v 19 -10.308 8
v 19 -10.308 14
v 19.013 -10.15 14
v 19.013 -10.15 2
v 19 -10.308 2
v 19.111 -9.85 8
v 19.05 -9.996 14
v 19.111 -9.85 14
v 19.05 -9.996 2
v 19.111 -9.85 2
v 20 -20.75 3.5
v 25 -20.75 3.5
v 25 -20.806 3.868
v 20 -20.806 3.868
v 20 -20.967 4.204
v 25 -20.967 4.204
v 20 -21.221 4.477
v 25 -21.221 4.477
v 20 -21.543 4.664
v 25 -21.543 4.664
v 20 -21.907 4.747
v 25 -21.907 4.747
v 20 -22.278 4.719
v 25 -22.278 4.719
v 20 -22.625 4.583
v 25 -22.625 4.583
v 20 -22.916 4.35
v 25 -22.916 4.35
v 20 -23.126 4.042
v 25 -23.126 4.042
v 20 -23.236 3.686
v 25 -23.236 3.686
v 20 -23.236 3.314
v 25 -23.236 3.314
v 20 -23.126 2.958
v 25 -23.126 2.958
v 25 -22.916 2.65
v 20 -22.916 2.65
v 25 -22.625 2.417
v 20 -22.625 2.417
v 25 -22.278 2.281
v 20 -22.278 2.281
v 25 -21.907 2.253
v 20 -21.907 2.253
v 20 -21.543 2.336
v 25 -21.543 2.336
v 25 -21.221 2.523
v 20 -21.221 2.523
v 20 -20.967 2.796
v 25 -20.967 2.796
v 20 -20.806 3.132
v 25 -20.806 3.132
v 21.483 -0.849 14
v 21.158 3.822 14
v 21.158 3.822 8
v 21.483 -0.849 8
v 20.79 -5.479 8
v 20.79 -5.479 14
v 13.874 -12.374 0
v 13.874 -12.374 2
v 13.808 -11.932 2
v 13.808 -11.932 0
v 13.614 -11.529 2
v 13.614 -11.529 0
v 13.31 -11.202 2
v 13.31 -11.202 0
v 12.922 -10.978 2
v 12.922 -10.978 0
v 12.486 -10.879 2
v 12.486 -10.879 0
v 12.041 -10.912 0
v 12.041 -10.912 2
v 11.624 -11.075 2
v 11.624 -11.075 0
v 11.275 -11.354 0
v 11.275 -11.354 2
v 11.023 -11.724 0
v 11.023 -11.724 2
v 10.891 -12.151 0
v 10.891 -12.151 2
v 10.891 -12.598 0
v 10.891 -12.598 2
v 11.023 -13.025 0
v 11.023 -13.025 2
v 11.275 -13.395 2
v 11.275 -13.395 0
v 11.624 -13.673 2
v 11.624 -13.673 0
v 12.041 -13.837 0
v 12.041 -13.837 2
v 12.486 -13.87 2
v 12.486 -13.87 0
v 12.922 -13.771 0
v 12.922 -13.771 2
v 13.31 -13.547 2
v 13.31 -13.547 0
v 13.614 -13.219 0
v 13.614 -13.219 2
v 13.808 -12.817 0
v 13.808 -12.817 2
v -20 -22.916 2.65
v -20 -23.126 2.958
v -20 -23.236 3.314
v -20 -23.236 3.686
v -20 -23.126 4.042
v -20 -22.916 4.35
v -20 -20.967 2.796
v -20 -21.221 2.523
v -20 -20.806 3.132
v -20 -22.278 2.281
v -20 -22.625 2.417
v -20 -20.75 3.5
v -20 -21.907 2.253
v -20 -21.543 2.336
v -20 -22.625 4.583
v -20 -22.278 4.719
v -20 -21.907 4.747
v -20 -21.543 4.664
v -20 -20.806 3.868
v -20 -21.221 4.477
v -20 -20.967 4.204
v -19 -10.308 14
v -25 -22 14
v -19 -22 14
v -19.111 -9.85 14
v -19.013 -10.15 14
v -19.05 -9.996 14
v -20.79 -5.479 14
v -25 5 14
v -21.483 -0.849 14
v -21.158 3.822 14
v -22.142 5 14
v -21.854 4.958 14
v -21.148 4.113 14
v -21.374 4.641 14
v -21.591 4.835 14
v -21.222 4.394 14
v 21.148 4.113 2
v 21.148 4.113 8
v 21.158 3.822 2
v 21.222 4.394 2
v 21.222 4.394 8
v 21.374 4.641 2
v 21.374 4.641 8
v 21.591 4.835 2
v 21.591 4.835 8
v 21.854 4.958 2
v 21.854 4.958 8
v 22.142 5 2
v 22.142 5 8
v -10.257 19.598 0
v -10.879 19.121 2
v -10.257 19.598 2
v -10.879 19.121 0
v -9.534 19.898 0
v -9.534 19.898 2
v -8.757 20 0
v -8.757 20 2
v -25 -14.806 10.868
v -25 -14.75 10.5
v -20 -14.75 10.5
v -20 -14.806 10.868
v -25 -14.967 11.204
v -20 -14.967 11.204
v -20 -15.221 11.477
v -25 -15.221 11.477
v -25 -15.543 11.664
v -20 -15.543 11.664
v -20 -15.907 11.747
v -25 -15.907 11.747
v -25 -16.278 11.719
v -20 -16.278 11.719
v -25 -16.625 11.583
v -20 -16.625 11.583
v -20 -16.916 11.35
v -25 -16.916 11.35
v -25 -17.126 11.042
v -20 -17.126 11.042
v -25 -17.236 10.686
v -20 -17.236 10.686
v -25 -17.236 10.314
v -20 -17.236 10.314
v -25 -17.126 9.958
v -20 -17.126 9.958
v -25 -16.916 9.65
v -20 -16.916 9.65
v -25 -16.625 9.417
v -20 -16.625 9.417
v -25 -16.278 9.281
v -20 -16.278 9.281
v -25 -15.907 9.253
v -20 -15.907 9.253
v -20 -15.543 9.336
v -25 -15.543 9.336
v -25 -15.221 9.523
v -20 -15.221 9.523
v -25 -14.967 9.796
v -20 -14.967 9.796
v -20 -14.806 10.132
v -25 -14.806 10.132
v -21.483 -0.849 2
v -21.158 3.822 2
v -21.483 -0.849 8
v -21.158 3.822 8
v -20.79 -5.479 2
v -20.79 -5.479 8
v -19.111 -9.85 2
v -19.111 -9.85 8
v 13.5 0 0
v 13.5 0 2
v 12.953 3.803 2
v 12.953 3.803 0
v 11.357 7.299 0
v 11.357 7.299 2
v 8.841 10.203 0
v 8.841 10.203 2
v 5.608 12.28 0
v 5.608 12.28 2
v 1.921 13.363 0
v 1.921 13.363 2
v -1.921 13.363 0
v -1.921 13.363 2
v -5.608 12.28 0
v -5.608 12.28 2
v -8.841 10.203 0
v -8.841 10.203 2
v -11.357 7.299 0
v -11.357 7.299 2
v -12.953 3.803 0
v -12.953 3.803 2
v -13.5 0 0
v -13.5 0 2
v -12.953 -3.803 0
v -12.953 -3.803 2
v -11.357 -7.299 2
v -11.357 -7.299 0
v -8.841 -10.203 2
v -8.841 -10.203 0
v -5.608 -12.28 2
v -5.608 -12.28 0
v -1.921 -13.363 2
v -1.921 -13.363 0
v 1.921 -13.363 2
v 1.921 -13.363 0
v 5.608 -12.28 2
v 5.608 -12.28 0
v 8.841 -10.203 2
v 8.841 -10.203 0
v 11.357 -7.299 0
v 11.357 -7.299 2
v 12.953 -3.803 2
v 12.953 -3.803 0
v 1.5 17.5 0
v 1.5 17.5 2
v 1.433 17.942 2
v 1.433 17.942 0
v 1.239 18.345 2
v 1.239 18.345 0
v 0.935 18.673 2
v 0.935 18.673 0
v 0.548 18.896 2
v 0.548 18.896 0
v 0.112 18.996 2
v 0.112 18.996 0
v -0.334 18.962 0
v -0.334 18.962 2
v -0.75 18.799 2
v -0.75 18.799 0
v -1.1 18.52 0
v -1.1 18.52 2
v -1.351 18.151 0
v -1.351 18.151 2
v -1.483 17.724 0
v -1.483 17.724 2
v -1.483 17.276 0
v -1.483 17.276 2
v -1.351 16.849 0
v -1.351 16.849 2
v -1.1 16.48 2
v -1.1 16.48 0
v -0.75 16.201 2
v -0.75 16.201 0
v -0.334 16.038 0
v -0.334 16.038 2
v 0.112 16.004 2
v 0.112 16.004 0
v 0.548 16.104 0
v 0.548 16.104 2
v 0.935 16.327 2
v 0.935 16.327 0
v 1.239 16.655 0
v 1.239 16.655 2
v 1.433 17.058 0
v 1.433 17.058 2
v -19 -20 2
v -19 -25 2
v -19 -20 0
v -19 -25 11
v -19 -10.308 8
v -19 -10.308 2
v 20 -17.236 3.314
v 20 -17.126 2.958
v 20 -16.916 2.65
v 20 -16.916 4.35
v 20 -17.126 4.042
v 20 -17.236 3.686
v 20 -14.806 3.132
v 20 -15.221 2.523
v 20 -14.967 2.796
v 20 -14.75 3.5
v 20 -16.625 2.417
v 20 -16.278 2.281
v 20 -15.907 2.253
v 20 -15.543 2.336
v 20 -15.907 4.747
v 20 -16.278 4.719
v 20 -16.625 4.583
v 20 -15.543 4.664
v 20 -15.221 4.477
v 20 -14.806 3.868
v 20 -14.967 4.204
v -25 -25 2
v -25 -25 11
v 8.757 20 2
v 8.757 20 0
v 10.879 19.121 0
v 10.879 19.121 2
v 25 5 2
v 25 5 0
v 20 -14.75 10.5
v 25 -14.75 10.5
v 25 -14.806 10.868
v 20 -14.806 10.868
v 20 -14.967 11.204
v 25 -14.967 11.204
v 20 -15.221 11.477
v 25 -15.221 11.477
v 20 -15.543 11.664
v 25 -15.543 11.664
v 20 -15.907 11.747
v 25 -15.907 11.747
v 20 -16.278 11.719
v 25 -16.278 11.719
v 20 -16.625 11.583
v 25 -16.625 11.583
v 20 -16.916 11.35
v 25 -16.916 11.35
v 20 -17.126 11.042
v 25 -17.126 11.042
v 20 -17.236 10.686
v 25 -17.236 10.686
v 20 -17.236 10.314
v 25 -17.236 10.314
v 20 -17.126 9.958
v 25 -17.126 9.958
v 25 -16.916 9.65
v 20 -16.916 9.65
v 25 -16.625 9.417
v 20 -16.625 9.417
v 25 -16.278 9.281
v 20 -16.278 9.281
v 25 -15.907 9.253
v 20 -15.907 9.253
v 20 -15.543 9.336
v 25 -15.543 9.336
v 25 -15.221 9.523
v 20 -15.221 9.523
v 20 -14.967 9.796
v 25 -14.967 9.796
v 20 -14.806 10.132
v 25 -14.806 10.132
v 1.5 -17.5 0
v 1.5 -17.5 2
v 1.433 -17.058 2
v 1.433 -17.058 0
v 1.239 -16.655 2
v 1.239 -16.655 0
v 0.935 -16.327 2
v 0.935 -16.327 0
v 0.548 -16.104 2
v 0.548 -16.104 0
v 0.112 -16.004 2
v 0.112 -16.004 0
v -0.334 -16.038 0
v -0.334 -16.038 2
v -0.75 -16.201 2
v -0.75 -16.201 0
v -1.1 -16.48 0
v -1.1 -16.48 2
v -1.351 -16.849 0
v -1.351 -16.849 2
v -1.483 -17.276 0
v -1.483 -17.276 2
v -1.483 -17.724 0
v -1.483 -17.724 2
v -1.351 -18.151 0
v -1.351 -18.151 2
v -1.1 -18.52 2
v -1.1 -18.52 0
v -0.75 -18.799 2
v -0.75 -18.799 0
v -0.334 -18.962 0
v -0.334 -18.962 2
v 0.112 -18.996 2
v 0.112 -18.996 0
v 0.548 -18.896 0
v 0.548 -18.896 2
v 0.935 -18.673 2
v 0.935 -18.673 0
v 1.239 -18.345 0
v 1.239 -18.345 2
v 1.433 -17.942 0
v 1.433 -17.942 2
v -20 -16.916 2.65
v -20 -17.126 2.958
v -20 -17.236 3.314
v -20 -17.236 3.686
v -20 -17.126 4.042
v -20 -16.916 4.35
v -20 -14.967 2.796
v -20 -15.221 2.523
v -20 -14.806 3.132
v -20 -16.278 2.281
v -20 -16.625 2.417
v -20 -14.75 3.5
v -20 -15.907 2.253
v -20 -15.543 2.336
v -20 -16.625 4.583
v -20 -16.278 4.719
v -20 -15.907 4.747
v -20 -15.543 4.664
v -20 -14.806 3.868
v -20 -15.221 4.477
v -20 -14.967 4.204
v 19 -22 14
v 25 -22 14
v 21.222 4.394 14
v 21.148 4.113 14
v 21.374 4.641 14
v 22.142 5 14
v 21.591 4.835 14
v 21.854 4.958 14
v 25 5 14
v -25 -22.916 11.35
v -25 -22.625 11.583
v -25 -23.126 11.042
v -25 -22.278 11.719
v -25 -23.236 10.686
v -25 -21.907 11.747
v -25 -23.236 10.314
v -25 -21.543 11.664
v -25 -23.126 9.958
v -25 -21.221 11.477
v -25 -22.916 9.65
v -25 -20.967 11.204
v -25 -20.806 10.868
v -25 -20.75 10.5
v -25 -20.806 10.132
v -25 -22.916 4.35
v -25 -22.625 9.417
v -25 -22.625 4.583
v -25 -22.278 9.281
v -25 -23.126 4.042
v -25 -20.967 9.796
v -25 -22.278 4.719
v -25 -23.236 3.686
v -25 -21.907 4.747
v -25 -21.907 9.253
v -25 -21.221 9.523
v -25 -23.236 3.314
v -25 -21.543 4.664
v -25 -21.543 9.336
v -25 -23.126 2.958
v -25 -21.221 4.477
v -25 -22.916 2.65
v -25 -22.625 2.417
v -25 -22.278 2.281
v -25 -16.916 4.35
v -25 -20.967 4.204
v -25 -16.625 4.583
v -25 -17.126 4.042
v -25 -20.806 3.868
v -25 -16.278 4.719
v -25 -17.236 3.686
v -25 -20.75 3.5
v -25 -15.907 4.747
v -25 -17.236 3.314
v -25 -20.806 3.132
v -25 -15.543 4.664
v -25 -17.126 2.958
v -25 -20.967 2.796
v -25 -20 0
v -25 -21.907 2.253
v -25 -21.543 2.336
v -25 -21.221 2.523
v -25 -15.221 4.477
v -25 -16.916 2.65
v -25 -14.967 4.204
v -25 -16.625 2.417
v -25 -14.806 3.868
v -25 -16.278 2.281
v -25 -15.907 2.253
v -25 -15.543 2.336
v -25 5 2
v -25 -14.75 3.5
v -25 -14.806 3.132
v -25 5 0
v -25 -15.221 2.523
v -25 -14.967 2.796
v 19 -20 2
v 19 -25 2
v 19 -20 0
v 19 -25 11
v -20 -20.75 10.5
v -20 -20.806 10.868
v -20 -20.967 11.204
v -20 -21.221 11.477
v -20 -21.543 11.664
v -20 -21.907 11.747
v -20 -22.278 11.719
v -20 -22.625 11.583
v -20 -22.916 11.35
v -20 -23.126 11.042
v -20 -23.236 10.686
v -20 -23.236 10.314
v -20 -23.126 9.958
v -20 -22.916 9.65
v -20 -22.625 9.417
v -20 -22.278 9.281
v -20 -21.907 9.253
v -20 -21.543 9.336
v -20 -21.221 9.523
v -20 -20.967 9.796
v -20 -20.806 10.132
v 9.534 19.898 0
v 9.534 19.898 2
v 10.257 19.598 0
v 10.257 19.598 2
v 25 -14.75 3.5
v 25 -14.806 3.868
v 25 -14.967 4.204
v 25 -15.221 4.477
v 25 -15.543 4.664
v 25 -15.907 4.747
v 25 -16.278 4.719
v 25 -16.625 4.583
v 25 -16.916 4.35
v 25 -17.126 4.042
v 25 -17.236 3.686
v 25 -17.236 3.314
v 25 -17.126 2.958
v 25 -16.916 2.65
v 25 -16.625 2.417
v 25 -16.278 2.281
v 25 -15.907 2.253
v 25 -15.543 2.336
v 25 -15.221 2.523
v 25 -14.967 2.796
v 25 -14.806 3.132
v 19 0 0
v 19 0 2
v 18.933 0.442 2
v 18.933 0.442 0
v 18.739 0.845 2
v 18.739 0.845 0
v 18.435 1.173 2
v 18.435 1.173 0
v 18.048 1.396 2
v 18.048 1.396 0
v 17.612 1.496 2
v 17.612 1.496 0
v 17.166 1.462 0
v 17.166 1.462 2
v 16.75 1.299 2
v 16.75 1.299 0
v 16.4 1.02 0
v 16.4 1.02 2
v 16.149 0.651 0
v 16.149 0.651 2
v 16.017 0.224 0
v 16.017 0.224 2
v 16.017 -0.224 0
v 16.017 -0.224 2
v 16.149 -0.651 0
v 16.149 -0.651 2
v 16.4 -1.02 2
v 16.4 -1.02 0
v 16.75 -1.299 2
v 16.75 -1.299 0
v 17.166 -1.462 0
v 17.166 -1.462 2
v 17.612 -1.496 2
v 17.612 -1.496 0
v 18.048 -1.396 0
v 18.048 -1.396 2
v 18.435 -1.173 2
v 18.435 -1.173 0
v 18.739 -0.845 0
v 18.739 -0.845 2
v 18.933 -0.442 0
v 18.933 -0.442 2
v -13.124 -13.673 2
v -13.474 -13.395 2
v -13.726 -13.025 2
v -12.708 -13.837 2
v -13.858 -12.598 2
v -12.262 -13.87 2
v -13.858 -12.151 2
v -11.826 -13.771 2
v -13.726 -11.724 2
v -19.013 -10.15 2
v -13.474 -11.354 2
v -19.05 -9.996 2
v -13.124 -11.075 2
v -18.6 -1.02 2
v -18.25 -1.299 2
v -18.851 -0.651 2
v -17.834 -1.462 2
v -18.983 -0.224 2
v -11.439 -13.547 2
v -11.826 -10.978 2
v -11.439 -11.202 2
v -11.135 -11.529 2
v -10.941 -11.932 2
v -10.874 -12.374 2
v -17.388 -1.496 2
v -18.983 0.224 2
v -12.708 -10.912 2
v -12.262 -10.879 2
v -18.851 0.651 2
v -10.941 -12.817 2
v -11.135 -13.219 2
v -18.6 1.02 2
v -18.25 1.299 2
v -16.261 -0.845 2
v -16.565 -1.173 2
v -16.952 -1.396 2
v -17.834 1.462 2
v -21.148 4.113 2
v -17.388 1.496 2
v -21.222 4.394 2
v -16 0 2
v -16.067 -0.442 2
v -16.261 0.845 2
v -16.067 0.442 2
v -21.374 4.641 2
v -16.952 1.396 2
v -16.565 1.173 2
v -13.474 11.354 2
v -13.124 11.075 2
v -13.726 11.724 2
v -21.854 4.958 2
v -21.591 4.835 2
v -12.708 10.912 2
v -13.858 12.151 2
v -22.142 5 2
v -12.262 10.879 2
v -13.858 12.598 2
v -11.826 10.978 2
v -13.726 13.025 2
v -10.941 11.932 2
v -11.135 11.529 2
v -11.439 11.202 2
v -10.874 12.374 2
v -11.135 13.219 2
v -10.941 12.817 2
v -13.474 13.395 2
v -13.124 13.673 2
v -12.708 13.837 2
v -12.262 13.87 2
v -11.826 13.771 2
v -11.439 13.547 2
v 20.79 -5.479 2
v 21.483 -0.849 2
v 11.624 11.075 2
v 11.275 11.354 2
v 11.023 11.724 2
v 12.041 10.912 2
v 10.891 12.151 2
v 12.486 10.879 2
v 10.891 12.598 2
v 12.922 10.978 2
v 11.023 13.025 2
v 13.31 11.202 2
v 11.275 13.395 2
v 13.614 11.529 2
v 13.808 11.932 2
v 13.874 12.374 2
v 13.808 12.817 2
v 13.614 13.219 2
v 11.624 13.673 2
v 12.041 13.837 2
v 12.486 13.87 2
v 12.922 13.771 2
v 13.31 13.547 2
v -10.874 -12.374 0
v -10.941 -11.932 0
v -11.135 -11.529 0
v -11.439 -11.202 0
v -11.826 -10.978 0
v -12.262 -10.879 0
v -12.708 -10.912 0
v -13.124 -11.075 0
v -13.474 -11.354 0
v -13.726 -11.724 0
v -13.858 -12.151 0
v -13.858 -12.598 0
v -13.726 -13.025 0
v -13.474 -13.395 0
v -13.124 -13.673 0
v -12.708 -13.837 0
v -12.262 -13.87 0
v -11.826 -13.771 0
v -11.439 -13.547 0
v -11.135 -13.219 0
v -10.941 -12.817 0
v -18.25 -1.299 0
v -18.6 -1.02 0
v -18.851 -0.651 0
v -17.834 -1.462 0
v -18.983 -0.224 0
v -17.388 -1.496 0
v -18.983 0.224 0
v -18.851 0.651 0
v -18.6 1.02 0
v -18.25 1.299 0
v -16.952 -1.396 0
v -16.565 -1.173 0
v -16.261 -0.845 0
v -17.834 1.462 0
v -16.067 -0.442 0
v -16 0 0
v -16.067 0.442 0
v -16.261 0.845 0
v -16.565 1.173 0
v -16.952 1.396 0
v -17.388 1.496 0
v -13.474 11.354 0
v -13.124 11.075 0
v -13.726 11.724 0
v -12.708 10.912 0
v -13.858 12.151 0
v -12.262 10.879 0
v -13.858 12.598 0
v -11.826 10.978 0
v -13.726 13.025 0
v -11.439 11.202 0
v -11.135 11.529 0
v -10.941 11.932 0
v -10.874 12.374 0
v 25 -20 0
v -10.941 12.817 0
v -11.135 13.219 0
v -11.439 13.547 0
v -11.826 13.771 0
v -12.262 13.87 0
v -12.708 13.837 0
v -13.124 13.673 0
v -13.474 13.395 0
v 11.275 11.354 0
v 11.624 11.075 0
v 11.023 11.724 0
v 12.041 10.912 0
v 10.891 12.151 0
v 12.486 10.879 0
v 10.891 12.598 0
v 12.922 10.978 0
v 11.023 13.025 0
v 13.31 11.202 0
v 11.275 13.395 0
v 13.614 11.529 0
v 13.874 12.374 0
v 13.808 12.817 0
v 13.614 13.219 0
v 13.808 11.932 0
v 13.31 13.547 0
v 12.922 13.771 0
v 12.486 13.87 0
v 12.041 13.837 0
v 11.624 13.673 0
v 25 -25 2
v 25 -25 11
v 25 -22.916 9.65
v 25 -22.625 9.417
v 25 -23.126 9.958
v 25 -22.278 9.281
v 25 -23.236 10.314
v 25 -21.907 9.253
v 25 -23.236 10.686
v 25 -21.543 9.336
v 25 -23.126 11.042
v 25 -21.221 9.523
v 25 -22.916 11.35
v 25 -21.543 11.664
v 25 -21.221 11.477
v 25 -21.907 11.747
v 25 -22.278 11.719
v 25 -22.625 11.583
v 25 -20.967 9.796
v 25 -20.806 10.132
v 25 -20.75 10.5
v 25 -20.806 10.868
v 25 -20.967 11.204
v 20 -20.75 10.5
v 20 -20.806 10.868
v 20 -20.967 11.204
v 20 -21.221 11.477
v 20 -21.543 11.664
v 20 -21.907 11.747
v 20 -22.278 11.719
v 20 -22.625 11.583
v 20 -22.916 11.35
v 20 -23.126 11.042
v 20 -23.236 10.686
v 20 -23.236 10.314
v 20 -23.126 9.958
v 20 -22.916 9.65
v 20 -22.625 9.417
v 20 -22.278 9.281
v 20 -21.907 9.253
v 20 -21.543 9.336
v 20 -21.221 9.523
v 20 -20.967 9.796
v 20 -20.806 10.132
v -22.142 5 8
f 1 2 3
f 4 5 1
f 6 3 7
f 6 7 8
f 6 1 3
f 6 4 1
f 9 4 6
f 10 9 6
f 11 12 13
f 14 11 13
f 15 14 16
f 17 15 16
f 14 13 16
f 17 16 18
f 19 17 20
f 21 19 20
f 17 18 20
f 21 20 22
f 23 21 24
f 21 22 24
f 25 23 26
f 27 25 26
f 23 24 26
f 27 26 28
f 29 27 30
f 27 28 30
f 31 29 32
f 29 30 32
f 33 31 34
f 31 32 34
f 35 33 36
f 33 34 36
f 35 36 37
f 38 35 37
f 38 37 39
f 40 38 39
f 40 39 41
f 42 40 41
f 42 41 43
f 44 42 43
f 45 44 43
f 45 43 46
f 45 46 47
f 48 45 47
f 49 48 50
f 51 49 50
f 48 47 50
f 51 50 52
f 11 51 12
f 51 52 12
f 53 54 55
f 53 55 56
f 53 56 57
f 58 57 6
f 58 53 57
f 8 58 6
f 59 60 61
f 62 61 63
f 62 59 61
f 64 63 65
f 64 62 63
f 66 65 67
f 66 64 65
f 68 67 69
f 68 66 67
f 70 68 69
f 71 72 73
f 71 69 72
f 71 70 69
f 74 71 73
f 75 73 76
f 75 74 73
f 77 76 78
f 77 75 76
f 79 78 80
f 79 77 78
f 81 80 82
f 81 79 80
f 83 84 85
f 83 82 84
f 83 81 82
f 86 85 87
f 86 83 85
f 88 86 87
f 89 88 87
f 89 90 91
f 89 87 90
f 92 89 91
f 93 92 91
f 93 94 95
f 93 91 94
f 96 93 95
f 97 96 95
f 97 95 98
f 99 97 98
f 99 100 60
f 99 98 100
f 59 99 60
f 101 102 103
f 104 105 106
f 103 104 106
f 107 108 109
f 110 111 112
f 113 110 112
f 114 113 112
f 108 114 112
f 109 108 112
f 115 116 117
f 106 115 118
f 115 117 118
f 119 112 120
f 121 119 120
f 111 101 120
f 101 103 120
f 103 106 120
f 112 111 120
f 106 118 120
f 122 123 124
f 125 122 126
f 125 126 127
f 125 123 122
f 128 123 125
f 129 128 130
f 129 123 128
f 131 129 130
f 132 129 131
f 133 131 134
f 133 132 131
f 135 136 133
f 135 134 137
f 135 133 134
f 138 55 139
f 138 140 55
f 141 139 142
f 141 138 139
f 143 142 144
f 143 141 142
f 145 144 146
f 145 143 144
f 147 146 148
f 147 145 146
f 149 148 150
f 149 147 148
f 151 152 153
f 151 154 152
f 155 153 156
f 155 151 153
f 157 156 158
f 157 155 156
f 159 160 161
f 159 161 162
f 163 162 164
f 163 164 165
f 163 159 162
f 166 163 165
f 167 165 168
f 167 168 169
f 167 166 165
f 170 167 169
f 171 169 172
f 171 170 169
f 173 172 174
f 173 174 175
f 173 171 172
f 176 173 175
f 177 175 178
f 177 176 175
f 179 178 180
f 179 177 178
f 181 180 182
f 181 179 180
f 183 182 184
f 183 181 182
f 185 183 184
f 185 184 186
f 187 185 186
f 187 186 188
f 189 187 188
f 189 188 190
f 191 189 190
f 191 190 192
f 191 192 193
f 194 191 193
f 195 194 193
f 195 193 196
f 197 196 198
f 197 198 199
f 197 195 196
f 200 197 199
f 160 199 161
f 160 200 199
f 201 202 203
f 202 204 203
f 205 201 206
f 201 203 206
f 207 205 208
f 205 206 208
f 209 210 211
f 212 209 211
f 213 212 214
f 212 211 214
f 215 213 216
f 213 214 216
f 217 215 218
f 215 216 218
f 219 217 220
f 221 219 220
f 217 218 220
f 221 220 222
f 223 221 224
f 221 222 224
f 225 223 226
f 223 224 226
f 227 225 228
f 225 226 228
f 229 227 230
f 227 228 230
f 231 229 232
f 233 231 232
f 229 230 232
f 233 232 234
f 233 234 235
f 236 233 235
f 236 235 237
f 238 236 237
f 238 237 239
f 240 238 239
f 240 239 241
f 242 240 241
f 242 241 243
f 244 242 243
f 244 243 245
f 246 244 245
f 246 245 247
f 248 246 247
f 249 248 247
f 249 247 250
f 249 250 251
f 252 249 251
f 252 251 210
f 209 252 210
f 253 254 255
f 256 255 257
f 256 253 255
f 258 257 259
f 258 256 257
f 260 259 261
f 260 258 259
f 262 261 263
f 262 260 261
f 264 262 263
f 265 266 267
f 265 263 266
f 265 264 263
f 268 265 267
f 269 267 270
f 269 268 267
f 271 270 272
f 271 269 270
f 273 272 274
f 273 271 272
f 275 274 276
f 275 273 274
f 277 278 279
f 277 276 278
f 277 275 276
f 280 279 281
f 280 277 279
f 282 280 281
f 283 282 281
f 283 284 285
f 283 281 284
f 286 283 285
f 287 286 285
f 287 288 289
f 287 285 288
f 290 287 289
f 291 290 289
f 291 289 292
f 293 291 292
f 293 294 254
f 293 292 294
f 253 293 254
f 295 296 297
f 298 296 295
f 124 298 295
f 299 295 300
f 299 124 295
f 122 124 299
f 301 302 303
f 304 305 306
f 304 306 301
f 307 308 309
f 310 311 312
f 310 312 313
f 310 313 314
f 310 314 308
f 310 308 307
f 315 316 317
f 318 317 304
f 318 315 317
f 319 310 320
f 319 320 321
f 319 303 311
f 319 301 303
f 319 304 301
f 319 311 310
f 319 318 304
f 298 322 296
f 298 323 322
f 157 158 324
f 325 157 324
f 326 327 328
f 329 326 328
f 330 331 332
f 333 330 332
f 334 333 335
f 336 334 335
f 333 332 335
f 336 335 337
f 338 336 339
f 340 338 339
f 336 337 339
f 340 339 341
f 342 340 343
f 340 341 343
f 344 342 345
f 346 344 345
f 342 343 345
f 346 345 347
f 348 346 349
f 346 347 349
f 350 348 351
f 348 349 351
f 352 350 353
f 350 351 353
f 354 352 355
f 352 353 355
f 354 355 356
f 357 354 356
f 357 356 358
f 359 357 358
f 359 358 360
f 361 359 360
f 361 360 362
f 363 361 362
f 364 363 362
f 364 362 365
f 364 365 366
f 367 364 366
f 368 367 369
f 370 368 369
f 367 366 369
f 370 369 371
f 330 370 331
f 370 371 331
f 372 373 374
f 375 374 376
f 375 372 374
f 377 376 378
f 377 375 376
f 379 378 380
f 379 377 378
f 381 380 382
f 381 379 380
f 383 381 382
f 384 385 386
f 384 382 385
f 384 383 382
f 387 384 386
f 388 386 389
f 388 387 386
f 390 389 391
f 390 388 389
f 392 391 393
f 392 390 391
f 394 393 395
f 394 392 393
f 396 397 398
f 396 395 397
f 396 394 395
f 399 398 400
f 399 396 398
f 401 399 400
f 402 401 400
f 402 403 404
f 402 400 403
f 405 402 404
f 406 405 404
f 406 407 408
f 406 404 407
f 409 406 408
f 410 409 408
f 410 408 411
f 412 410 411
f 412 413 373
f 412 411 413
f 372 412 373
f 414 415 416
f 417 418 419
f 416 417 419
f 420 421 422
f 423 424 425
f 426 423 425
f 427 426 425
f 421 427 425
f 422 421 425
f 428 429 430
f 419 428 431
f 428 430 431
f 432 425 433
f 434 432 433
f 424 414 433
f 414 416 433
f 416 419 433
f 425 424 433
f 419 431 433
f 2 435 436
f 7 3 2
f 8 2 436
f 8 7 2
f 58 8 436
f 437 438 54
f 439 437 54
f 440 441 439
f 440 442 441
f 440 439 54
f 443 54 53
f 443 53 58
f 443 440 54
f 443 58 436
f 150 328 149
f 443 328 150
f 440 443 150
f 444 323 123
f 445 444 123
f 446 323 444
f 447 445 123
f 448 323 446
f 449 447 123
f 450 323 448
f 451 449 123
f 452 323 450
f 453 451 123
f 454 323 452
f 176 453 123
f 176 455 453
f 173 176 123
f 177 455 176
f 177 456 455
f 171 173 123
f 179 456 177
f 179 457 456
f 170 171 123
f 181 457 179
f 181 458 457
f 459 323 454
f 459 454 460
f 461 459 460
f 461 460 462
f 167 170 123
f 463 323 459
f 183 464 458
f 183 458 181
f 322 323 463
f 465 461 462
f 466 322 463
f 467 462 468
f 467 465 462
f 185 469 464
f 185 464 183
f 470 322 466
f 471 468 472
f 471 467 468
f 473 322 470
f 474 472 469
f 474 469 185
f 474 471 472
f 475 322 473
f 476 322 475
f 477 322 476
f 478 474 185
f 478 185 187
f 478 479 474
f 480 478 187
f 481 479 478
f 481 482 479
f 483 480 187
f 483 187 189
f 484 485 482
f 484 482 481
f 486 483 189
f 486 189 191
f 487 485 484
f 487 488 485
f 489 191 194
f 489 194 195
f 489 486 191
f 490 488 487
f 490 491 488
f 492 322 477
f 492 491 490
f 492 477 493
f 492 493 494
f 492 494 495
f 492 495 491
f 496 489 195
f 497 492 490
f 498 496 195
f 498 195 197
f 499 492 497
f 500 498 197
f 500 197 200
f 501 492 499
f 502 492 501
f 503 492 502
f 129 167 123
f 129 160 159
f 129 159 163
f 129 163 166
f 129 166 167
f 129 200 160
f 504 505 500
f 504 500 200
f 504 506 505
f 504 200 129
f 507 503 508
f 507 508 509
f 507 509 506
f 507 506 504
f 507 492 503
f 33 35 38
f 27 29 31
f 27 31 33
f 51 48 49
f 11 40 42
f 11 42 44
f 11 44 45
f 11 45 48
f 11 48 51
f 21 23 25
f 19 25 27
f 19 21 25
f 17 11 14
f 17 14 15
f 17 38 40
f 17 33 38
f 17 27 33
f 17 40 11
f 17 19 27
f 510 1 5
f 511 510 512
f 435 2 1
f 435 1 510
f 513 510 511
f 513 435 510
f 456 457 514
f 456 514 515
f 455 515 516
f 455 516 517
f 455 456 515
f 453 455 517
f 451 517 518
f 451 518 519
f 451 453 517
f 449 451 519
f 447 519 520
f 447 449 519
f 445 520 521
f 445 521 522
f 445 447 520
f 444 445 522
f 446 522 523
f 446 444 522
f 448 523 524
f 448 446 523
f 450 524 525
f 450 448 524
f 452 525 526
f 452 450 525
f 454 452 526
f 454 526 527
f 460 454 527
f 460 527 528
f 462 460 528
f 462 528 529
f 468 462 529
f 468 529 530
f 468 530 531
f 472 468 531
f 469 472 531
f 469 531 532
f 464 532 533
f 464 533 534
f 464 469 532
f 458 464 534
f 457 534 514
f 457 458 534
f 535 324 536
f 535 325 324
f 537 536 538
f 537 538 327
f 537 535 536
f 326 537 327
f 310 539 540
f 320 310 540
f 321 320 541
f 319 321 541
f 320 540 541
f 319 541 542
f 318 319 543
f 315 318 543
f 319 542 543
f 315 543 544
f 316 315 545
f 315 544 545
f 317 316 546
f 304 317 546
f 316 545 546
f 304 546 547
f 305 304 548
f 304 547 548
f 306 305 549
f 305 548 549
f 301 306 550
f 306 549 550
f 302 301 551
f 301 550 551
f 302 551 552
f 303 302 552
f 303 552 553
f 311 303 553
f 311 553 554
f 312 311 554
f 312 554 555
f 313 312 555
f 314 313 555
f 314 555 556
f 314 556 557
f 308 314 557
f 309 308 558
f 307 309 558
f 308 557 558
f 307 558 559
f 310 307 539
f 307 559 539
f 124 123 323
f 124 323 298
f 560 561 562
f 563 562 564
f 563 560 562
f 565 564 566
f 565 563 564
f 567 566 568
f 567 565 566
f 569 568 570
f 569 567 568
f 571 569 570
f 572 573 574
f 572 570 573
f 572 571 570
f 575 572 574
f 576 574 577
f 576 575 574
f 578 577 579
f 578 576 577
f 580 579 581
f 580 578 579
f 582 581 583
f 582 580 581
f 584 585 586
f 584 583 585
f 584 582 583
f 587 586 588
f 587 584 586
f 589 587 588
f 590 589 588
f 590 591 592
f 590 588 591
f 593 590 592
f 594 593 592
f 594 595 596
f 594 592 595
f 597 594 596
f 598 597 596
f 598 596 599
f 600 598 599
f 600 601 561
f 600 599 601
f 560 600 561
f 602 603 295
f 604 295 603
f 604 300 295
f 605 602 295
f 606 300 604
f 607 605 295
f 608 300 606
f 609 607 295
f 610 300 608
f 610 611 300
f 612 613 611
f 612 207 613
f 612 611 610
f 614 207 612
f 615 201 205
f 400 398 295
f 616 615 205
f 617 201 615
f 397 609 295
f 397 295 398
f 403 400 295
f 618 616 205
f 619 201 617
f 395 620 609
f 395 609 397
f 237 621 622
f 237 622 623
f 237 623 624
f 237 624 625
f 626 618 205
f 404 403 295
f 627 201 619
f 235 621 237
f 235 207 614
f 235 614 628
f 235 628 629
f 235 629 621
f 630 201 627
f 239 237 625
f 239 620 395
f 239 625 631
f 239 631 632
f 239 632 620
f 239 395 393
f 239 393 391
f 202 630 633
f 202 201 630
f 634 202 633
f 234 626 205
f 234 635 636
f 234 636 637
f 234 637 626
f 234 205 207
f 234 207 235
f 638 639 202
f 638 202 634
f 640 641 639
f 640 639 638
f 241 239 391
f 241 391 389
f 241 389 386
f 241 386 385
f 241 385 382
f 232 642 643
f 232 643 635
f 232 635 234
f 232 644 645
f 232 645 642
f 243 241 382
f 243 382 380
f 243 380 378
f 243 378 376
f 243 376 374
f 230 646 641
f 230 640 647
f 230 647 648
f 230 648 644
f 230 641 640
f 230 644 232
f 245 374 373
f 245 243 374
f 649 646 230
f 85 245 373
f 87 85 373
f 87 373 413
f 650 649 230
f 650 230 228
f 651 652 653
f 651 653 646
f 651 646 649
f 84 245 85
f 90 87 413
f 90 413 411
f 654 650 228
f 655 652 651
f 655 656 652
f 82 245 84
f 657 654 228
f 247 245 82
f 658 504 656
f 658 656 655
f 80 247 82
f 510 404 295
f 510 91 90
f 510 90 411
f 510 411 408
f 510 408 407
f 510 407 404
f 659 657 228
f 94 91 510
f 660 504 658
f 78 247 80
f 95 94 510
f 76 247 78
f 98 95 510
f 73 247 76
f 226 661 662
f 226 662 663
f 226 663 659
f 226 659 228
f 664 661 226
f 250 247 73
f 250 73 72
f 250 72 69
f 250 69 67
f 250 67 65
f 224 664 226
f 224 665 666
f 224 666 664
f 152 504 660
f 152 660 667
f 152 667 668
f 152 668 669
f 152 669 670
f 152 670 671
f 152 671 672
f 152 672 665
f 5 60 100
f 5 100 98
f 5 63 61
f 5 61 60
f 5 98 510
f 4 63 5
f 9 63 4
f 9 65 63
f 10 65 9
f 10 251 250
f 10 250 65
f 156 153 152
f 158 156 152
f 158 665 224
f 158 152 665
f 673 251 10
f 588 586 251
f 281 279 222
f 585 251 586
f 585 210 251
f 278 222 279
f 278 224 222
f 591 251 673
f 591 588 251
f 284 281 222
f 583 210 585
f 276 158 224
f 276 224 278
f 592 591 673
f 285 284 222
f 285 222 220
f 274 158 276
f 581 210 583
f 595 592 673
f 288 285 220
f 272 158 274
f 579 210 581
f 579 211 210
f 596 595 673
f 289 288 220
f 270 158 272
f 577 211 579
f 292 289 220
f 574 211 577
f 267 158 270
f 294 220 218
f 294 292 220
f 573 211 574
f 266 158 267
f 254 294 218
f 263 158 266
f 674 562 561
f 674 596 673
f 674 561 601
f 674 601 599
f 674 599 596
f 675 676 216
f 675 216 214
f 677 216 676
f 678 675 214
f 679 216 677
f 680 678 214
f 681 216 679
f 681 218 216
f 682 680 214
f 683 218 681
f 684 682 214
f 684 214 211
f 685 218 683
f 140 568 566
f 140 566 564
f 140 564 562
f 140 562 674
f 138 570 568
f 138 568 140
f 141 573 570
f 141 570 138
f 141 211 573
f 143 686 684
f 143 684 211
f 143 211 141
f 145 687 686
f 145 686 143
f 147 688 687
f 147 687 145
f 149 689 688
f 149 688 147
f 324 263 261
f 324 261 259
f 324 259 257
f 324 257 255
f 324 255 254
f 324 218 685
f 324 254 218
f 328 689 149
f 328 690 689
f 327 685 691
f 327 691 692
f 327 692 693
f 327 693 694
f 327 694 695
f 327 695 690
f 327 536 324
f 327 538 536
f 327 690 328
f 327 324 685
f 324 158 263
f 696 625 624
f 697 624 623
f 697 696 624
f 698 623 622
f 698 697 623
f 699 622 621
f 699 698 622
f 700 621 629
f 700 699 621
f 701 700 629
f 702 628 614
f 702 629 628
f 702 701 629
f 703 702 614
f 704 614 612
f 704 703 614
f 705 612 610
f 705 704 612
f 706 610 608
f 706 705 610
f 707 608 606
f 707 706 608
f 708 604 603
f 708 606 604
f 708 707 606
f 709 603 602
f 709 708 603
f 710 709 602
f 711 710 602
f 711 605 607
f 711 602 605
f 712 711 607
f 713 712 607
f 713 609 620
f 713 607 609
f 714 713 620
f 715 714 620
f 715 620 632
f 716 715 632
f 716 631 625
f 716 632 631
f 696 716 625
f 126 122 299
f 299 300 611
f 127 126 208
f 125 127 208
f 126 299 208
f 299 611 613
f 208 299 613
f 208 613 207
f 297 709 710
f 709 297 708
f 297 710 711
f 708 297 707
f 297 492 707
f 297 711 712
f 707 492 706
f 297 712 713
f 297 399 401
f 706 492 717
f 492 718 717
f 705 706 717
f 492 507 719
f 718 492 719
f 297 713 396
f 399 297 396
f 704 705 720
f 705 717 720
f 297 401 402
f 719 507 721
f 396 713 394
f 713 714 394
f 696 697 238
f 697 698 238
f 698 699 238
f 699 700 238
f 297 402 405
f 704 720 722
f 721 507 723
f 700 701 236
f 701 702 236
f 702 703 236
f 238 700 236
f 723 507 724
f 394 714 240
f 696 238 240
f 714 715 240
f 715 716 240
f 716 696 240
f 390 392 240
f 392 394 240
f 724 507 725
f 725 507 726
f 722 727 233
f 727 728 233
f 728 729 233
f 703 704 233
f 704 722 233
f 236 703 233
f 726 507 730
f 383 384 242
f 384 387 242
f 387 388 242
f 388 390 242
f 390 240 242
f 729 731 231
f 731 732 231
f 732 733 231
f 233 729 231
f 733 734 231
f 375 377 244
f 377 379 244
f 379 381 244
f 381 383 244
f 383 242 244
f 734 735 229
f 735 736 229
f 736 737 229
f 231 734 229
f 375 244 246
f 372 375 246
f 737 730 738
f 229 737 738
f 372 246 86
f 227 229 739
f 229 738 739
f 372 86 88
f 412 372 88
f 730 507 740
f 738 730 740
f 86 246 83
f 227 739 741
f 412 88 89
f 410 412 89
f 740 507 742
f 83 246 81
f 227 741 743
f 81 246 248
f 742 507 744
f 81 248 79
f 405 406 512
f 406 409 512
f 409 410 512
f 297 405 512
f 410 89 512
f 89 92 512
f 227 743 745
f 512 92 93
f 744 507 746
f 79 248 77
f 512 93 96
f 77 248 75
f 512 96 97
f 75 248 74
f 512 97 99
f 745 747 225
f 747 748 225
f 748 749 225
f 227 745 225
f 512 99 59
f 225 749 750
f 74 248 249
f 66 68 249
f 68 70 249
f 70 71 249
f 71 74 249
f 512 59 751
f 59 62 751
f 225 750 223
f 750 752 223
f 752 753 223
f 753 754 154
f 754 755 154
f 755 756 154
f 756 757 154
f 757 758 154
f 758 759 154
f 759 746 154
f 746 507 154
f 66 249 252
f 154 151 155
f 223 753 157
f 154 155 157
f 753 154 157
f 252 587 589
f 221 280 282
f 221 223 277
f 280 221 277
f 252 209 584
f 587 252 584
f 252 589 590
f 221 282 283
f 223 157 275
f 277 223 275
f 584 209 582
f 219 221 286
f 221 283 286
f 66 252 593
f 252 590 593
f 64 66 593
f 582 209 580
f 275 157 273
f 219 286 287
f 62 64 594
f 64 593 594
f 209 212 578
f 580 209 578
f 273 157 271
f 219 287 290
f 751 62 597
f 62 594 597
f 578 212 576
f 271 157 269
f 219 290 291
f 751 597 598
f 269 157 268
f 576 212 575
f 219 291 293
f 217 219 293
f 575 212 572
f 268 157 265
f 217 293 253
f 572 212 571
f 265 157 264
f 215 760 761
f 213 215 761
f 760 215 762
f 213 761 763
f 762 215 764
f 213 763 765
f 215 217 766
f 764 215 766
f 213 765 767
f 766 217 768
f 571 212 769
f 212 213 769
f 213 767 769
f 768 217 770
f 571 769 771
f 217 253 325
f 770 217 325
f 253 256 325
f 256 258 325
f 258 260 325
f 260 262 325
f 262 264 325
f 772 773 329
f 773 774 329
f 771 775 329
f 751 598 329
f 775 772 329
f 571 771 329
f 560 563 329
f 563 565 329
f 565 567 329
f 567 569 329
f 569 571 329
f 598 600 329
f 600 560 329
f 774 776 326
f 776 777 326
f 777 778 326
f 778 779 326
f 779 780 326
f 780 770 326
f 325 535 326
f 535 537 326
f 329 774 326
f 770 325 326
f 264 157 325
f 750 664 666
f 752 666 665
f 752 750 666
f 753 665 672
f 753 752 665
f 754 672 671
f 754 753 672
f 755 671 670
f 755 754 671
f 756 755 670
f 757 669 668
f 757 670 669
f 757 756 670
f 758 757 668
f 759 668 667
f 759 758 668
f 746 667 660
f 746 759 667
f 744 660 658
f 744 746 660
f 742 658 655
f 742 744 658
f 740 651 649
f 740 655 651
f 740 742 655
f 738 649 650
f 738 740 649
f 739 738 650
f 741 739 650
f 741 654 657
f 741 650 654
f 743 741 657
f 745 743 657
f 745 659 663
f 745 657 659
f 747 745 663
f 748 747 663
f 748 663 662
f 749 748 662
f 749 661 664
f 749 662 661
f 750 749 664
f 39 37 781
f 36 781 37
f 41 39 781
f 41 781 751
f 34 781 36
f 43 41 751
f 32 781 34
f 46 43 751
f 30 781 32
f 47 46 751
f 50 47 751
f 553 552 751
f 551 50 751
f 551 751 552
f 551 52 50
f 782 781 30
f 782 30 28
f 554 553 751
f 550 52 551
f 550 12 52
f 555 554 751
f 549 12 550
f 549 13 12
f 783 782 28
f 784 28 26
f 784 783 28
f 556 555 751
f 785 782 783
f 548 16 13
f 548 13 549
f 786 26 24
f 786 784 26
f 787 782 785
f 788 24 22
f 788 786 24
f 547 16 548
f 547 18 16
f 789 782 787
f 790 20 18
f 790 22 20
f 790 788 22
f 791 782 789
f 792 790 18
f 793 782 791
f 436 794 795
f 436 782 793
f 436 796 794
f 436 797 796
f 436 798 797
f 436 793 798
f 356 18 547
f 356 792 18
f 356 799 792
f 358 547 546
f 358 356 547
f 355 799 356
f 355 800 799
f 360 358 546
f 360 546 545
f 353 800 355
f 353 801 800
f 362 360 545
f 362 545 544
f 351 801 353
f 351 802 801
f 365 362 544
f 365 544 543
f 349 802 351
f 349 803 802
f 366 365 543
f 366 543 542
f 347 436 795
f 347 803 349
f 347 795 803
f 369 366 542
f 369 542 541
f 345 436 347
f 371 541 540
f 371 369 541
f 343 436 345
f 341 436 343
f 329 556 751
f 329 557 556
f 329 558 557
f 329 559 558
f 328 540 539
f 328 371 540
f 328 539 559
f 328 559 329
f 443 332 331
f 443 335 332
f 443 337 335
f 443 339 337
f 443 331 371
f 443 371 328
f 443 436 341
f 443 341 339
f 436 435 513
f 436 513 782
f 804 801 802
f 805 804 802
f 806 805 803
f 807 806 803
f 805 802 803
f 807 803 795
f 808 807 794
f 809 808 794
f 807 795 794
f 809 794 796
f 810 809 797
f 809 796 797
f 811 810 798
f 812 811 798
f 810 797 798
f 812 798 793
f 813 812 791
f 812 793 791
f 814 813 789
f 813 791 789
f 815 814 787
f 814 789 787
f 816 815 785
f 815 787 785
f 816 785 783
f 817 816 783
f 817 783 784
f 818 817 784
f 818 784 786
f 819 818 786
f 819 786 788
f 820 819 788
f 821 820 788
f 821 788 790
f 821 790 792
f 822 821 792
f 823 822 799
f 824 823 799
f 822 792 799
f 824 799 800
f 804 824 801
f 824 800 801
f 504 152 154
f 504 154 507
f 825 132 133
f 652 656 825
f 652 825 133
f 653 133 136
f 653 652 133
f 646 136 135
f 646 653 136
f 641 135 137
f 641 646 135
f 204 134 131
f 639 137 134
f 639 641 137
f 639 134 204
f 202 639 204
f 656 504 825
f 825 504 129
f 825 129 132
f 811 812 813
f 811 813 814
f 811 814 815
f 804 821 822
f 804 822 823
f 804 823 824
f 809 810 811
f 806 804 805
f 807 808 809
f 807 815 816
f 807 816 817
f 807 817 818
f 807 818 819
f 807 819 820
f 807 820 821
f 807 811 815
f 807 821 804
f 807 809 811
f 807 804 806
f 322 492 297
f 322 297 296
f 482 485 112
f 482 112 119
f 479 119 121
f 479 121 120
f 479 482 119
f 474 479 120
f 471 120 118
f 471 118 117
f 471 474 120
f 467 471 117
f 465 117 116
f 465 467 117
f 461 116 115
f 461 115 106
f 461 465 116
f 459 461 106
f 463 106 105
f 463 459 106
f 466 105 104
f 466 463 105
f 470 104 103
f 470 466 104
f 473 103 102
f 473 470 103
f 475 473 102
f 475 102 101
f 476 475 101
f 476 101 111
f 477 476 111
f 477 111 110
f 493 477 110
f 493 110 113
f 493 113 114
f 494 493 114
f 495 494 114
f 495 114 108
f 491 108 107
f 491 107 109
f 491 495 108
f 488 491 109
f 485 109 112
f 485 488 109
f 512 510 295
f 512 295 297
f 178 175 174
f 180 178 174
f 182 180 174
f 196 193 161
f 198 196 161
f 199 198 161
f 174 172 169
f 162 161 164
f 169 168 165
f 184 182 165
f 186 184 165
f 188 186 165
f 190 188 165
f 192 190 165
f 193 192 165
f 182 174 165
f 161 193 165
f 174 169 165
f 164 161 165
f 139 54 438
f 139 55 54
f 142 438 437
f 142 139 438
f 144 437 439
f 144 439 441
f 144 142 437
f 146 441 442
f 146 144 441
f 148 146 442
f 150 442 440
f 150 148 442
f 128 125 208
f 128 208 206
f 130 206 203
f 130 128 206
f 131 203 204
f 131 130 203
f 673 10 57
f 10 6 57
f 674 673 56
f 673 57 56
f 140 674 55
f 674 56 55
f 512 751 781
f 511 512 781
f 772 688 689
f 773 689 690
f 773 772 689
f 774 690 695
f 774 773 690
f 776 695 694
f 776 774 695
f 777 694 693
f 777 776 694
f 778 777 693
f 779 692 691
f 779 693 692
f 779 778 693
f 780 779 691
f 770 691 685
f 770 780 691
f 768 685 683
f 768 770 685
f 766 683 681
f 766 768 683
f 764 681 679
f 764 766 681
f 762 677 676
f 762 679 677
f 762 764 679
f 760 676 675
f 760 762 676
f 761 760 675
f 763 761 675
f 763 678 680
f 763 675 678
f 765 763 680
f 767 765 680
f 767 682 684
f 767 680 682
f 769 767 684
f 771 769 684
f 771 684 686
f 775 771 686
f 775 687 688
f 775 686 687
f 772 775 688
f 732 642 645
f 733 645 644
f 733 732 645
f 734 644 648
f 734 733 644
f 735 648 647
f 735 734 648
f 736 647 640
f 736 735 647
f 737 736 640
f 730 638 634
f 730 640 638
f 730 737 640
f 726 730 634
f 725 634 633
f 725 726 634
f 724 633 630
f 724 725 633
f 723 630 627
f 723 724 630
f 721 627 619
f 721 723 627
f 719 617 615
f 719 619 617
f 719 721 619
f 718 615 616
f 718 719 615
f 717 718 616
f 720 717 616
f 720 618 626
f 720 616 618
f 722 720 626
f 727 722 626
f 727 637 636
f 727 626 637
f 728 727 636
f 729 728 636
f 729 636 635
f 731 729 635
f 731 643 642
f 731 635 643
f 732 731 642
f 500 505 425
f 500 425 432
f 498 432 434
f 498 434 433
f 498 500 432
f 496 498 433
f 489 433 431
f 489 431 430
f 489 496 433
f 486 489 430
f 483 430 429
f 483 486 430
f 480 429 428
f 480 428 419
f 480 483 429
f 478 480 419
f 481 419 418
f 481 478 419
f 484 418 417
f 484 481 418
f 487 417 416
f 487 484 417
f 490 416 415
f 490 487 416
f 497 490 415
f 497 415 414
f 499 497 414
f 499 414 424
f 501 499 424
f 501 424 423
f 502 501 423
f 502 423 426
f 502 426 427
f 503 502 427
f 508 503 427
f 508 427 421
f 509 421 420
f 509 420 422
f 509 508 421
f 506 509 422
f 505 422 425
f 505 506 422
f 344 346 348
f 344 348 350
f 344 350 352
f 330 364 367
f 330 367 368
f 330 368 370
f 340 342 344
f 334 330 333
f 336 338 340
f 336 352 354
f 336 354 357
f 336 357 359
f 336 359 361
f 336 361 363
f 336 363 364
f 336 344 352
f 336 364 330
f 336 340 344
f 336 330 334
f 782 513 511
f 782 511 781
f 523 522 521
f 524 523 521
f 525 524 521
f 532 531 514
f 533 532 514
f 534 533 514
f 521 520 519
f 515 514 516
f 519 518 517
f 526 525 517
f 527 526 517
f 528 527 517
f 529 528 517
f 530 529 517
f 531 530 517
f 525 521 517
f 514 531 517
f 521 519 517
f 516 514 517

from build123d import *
from build123d.topology import SkipClean

# Parameters (mm, degrees)
SKETCH_1_W          = 50
SKETCH_1_H          = 50
SKETCH_1_R          = 21.5
SKETCH_1_R_2        = 13.5
SKETCH_1_R_3        = 1.5
EXTRUDE_1_DEPTH     = 8
SKETCH_2_R          = 21.5
CUT_EXTRUDE_1_DEPTH = 6
SKETCH_3_W          = 50
SKETCH_3_H          = 5
CUT_EXTRUDE_2_DEPTH = 27
CUT_EXTRUDE_3_DEPTH = 10
SKETCH_5_W          = 59.949446365
SKETCH_5_H          = 15
CUT_EXTRUDE_4_DEPTH = 6
SKETCH_6_R          = 13.5
CUT_EXTRUDE_5_DEPTH = 10
SKETCH_7_W          = 38
SKETCH_7_H          = 25.671468353
CUT_EXTRUDE_6_DEPTH = 6
EXTRUDE_START       = 6
EXTRUDE_2_DEPTH     = 6
SKETCH_9_R          = 1.25
CUT_EXTRUDE_7_DEPTH = 5
FILLET_1_R          = 1
FILLET_2_R          = 3
CHAMFER_1_SIZE      = 3
CUT_EXTRUDE_8_DEPTH = 51
CUT_EXTRUDE_9_DEPTH = 38


with BuildPart() as part:
    # 草图1 → 凸台-拉伸1 (new body)
    # profile 1 of 3: a face of its own
    with BuildSketch(Plane.XY):
        Rectangle(SKETCH_1_W, SKETCH_1_H)
        Circle(SKETCH_1_R, mode=Mode.SUBTRACT)
    # profile 2 of 3: a face of its own
    with BuildSketch(Plane.XY):
        Circle(SKETCH_1_R)
        Circle(SKETCH_1_R_2, mode=Mode.SUBTRACT)
        with Locations((0, 17.5)):
            Circle(SKETCH_1_R_3, mode=Mode.SUBTRACT)
        with Locations((12.374368671, 12.374368671)):
            Circle(SKETCH_1_R_3, mode=Mode.SUBTRACT)
        with Locations((17.5, 0)):
            Circle(SKETCH_1_R_3, mode=Mode.SUBTRACT)
        with Locations((12.374368671, -12.374368671)):
            Circle(SKETCH_1_R_3, mode=Mode.SUBTRACT)
        with Locations((0, -17.5)):
            Circle(SKETCH_1_R_3, mode=Mode.SUBTRACT)
        with Locations((-12.374368671, -12.374368671)):
            Circle(SKETCH_1_R_3, mode=Mode.SUBTRACT)
        with Locations((-17.5, 0)):
            Circle(SKETCH_1_R_3, mode=Mode.SUBTRACT)
        with Locations((-12.374368671, 12.374368671)):
            Circle(SKETCH_1_R_3, mode=Mode.SUBTRACT)
    # profile 3 of 3: a face of its own
    with BuildSketch(Plane.XY):
        Circle(SKETCH_1_R_2)
    extrude(amount=EXTRUDE_1_DEPTH)

    # 草图2 → 切除-拉伸1 (cut)
    with BuildSketch(Plane.XY.offset(8)):
        Circle(SKETCH_2_R)
    extrude(amount=-CUT_EXTRUDE_1_DEPTH, mode=Mode.SUBTRACT)

    # 草图3 → 切除-拉伸2 (cut)
    with BuildSketch(Plane.XY.offset(8)):
        with Locations((0, 22.5)):
            Rectangle(SKETCH_3_W, SKETCH_3_H)
    extrude(amount=-CUT_EXTRUDE_2_DEPTH, mode=Mode.SUBTRACT)

    # 草图4 → 切除-拉伸3 (cut)
    with BuildSketch(Plane.XY.offset(8)):
        Polygon((-25, 5), (-25, 20), (-10, 20), align=None)
        Polygon((10, 20), (25, 5), (25, 20), align=None)
    extrude(amount=-CUT_EXTRUDE_3_DEPTH, mode=Mode.SUBTRACT)

    # 草图5 → 切除-拉伸4 (cut)
    with BuildSketch(Plane.XY.offset(8)):
        with Locations((-0.284795469, 12.5)):
            Rectangle(SKETCH_5_W, SKETCH_5_H)
    extrude(amount=-CUT_EXTRUDE_4_DEPTH, mode=Mode.SUBTRACT)

    # 草图6 → 切除-拉伸5 (cut)
    with BuildSketch(Plane.XY.offset(2)):
        Circle(SKETCH_6_R)
    extrude(amount=-CUT_EXTRUDE_5_DEPTH, mode=Mode.SUBTRACT)

    # 草图7 → 切除-拉伸6 (cut)
    with BuildSketch(Plane.XY.offset(8)):
        with Locations((0, -22.898040076)):
            Rectangle(SKETCH_7_W, SKETCH_7_H)
    extrude(amount=-CUT_EXTRUDE_6_DEPTH, mode=Mode.SUBTRACT)

    # 草图8 → 凸台-拉伸2 (add)
    with BuildSketch(Plane.XY.offset(8).offset(EXTRUDE_START)):
        with BuildLine():
            Line((19, -10.062305899), (19, -25))
            Line((19, -25), (25, -25))
            Line((25, -25), (25, 5))
            Line((25, 5), (20.910523666, 5))
            ThreePointArc((20.910523666, 5), (21.329105457, -2.70541317), (19, -10.062305899))
        make_face()
        with BuildLine():
            Line((-19, -25), (-19, -10.062305899))
            ThreePointArc((-19, -10.062305899), (-21.329105457, -2.70541317), (-20.910523666, 5))
            Line((-20.910523666, 5), (-25, 5))
            Line((-25, 5), (-25, -25))
            Line((-25, -25), (-19, -25))
        make_face()
    extrude(amount=-EXTRUDE_2_DEPTH)

    # 草图9 → 切除-拉伸7 (cut)
    with SkipClean():  # the faces are left unmerged after this step: merging them gives an invalid solid
        with BuildSketch(Plane(origin=(25, 0, 0), x_dir=(0, 0, -1), z_dir=(1, 0, 0))):
            with Locations(Location((-3.5, -16, 0), (0, 0, 90))):
                Circle(SKETCH_9_R)
            with Locations(Location((-3.5, -22, 0), (0, 0, 90))):
                Circle(SKETCH_9_R)
            with Locations(Location((-10.5, -16, 0), (0, 0, 90))):
                Circle(SKETCH_9_R)
            with Locations(Location((-10.5, -22, 0), (0, 0, 90))):
                Circle(SKETCH_9_R)
        cut_extrude_7 = extrude(amount=-CUT_EXTRUDE_7_DEPTH, mode=Mode.SUBTRACT)

    # 镜向1: 切除-拉伸7 across plane
    with SkipClean():  # the faces are left unmerged after this step: merging them gives an invalid solid
        add(cut_extrude_7.mirror(Plane(origin=(0, 0, 0), x_dir=(0, 0, 1), z_dir=(1, 0, 0))), mode=Mode.SUBTRACT)

    # 圆角1
    fillet_1_edges = [part.edges().sort_by_distance(p)[0] for p in [
        (20.910523666, 5, 8),
        (-20.910523666, 5, 11),
        (19, -10.062305899, 8),
        (-19, -10.062305899, 5),
    ]]
    fillet(fillet_1_edges, radius=FILLET_1_R)

    # 圆角2
    fillet_2_edges = [part.edges().sort_by_distance(p)[0] for p in [
        (10, 20, 1),
        (-10, 20, 1),
    ]]
    fillet(fillet_2_edges, radius=FILLET_2_R)

    # 倒角1
    chamfer_1_edges = [part.edges().sort_by_distance(p)[0] for p in [
        (22, -25, 14),
        (-22, -25, 14),
    ]]
    chamfer(chamfer_1_edges, length=CHAMFER_1_SIZE)

    # 草图10 → 切除-拉伸8 (cut)
    with BuildSketch(Plane(origin=(25, 0, 0), x_dir=(0, 0, -1), z_dir=(1, 0, 0))):
        Polygon((-2, -25), (0, -25), (0, -20), align=None)
    extrude(amount=-CUT_EXTRUDE_8_DEPTH, mode=Mode.SUBTRACT)

    # 草图11 → 切除-拉伸9 (cut)
    with BuildSketch(Plane.ZY.offset(-19)):
        Polygon((2, -25), (2, -20), (0, -20), align=None)
    extrude(amount=CUT_EXTRUDE_9_DEPTH, mode=Mode.SUBTRACT)


solid = part.part
